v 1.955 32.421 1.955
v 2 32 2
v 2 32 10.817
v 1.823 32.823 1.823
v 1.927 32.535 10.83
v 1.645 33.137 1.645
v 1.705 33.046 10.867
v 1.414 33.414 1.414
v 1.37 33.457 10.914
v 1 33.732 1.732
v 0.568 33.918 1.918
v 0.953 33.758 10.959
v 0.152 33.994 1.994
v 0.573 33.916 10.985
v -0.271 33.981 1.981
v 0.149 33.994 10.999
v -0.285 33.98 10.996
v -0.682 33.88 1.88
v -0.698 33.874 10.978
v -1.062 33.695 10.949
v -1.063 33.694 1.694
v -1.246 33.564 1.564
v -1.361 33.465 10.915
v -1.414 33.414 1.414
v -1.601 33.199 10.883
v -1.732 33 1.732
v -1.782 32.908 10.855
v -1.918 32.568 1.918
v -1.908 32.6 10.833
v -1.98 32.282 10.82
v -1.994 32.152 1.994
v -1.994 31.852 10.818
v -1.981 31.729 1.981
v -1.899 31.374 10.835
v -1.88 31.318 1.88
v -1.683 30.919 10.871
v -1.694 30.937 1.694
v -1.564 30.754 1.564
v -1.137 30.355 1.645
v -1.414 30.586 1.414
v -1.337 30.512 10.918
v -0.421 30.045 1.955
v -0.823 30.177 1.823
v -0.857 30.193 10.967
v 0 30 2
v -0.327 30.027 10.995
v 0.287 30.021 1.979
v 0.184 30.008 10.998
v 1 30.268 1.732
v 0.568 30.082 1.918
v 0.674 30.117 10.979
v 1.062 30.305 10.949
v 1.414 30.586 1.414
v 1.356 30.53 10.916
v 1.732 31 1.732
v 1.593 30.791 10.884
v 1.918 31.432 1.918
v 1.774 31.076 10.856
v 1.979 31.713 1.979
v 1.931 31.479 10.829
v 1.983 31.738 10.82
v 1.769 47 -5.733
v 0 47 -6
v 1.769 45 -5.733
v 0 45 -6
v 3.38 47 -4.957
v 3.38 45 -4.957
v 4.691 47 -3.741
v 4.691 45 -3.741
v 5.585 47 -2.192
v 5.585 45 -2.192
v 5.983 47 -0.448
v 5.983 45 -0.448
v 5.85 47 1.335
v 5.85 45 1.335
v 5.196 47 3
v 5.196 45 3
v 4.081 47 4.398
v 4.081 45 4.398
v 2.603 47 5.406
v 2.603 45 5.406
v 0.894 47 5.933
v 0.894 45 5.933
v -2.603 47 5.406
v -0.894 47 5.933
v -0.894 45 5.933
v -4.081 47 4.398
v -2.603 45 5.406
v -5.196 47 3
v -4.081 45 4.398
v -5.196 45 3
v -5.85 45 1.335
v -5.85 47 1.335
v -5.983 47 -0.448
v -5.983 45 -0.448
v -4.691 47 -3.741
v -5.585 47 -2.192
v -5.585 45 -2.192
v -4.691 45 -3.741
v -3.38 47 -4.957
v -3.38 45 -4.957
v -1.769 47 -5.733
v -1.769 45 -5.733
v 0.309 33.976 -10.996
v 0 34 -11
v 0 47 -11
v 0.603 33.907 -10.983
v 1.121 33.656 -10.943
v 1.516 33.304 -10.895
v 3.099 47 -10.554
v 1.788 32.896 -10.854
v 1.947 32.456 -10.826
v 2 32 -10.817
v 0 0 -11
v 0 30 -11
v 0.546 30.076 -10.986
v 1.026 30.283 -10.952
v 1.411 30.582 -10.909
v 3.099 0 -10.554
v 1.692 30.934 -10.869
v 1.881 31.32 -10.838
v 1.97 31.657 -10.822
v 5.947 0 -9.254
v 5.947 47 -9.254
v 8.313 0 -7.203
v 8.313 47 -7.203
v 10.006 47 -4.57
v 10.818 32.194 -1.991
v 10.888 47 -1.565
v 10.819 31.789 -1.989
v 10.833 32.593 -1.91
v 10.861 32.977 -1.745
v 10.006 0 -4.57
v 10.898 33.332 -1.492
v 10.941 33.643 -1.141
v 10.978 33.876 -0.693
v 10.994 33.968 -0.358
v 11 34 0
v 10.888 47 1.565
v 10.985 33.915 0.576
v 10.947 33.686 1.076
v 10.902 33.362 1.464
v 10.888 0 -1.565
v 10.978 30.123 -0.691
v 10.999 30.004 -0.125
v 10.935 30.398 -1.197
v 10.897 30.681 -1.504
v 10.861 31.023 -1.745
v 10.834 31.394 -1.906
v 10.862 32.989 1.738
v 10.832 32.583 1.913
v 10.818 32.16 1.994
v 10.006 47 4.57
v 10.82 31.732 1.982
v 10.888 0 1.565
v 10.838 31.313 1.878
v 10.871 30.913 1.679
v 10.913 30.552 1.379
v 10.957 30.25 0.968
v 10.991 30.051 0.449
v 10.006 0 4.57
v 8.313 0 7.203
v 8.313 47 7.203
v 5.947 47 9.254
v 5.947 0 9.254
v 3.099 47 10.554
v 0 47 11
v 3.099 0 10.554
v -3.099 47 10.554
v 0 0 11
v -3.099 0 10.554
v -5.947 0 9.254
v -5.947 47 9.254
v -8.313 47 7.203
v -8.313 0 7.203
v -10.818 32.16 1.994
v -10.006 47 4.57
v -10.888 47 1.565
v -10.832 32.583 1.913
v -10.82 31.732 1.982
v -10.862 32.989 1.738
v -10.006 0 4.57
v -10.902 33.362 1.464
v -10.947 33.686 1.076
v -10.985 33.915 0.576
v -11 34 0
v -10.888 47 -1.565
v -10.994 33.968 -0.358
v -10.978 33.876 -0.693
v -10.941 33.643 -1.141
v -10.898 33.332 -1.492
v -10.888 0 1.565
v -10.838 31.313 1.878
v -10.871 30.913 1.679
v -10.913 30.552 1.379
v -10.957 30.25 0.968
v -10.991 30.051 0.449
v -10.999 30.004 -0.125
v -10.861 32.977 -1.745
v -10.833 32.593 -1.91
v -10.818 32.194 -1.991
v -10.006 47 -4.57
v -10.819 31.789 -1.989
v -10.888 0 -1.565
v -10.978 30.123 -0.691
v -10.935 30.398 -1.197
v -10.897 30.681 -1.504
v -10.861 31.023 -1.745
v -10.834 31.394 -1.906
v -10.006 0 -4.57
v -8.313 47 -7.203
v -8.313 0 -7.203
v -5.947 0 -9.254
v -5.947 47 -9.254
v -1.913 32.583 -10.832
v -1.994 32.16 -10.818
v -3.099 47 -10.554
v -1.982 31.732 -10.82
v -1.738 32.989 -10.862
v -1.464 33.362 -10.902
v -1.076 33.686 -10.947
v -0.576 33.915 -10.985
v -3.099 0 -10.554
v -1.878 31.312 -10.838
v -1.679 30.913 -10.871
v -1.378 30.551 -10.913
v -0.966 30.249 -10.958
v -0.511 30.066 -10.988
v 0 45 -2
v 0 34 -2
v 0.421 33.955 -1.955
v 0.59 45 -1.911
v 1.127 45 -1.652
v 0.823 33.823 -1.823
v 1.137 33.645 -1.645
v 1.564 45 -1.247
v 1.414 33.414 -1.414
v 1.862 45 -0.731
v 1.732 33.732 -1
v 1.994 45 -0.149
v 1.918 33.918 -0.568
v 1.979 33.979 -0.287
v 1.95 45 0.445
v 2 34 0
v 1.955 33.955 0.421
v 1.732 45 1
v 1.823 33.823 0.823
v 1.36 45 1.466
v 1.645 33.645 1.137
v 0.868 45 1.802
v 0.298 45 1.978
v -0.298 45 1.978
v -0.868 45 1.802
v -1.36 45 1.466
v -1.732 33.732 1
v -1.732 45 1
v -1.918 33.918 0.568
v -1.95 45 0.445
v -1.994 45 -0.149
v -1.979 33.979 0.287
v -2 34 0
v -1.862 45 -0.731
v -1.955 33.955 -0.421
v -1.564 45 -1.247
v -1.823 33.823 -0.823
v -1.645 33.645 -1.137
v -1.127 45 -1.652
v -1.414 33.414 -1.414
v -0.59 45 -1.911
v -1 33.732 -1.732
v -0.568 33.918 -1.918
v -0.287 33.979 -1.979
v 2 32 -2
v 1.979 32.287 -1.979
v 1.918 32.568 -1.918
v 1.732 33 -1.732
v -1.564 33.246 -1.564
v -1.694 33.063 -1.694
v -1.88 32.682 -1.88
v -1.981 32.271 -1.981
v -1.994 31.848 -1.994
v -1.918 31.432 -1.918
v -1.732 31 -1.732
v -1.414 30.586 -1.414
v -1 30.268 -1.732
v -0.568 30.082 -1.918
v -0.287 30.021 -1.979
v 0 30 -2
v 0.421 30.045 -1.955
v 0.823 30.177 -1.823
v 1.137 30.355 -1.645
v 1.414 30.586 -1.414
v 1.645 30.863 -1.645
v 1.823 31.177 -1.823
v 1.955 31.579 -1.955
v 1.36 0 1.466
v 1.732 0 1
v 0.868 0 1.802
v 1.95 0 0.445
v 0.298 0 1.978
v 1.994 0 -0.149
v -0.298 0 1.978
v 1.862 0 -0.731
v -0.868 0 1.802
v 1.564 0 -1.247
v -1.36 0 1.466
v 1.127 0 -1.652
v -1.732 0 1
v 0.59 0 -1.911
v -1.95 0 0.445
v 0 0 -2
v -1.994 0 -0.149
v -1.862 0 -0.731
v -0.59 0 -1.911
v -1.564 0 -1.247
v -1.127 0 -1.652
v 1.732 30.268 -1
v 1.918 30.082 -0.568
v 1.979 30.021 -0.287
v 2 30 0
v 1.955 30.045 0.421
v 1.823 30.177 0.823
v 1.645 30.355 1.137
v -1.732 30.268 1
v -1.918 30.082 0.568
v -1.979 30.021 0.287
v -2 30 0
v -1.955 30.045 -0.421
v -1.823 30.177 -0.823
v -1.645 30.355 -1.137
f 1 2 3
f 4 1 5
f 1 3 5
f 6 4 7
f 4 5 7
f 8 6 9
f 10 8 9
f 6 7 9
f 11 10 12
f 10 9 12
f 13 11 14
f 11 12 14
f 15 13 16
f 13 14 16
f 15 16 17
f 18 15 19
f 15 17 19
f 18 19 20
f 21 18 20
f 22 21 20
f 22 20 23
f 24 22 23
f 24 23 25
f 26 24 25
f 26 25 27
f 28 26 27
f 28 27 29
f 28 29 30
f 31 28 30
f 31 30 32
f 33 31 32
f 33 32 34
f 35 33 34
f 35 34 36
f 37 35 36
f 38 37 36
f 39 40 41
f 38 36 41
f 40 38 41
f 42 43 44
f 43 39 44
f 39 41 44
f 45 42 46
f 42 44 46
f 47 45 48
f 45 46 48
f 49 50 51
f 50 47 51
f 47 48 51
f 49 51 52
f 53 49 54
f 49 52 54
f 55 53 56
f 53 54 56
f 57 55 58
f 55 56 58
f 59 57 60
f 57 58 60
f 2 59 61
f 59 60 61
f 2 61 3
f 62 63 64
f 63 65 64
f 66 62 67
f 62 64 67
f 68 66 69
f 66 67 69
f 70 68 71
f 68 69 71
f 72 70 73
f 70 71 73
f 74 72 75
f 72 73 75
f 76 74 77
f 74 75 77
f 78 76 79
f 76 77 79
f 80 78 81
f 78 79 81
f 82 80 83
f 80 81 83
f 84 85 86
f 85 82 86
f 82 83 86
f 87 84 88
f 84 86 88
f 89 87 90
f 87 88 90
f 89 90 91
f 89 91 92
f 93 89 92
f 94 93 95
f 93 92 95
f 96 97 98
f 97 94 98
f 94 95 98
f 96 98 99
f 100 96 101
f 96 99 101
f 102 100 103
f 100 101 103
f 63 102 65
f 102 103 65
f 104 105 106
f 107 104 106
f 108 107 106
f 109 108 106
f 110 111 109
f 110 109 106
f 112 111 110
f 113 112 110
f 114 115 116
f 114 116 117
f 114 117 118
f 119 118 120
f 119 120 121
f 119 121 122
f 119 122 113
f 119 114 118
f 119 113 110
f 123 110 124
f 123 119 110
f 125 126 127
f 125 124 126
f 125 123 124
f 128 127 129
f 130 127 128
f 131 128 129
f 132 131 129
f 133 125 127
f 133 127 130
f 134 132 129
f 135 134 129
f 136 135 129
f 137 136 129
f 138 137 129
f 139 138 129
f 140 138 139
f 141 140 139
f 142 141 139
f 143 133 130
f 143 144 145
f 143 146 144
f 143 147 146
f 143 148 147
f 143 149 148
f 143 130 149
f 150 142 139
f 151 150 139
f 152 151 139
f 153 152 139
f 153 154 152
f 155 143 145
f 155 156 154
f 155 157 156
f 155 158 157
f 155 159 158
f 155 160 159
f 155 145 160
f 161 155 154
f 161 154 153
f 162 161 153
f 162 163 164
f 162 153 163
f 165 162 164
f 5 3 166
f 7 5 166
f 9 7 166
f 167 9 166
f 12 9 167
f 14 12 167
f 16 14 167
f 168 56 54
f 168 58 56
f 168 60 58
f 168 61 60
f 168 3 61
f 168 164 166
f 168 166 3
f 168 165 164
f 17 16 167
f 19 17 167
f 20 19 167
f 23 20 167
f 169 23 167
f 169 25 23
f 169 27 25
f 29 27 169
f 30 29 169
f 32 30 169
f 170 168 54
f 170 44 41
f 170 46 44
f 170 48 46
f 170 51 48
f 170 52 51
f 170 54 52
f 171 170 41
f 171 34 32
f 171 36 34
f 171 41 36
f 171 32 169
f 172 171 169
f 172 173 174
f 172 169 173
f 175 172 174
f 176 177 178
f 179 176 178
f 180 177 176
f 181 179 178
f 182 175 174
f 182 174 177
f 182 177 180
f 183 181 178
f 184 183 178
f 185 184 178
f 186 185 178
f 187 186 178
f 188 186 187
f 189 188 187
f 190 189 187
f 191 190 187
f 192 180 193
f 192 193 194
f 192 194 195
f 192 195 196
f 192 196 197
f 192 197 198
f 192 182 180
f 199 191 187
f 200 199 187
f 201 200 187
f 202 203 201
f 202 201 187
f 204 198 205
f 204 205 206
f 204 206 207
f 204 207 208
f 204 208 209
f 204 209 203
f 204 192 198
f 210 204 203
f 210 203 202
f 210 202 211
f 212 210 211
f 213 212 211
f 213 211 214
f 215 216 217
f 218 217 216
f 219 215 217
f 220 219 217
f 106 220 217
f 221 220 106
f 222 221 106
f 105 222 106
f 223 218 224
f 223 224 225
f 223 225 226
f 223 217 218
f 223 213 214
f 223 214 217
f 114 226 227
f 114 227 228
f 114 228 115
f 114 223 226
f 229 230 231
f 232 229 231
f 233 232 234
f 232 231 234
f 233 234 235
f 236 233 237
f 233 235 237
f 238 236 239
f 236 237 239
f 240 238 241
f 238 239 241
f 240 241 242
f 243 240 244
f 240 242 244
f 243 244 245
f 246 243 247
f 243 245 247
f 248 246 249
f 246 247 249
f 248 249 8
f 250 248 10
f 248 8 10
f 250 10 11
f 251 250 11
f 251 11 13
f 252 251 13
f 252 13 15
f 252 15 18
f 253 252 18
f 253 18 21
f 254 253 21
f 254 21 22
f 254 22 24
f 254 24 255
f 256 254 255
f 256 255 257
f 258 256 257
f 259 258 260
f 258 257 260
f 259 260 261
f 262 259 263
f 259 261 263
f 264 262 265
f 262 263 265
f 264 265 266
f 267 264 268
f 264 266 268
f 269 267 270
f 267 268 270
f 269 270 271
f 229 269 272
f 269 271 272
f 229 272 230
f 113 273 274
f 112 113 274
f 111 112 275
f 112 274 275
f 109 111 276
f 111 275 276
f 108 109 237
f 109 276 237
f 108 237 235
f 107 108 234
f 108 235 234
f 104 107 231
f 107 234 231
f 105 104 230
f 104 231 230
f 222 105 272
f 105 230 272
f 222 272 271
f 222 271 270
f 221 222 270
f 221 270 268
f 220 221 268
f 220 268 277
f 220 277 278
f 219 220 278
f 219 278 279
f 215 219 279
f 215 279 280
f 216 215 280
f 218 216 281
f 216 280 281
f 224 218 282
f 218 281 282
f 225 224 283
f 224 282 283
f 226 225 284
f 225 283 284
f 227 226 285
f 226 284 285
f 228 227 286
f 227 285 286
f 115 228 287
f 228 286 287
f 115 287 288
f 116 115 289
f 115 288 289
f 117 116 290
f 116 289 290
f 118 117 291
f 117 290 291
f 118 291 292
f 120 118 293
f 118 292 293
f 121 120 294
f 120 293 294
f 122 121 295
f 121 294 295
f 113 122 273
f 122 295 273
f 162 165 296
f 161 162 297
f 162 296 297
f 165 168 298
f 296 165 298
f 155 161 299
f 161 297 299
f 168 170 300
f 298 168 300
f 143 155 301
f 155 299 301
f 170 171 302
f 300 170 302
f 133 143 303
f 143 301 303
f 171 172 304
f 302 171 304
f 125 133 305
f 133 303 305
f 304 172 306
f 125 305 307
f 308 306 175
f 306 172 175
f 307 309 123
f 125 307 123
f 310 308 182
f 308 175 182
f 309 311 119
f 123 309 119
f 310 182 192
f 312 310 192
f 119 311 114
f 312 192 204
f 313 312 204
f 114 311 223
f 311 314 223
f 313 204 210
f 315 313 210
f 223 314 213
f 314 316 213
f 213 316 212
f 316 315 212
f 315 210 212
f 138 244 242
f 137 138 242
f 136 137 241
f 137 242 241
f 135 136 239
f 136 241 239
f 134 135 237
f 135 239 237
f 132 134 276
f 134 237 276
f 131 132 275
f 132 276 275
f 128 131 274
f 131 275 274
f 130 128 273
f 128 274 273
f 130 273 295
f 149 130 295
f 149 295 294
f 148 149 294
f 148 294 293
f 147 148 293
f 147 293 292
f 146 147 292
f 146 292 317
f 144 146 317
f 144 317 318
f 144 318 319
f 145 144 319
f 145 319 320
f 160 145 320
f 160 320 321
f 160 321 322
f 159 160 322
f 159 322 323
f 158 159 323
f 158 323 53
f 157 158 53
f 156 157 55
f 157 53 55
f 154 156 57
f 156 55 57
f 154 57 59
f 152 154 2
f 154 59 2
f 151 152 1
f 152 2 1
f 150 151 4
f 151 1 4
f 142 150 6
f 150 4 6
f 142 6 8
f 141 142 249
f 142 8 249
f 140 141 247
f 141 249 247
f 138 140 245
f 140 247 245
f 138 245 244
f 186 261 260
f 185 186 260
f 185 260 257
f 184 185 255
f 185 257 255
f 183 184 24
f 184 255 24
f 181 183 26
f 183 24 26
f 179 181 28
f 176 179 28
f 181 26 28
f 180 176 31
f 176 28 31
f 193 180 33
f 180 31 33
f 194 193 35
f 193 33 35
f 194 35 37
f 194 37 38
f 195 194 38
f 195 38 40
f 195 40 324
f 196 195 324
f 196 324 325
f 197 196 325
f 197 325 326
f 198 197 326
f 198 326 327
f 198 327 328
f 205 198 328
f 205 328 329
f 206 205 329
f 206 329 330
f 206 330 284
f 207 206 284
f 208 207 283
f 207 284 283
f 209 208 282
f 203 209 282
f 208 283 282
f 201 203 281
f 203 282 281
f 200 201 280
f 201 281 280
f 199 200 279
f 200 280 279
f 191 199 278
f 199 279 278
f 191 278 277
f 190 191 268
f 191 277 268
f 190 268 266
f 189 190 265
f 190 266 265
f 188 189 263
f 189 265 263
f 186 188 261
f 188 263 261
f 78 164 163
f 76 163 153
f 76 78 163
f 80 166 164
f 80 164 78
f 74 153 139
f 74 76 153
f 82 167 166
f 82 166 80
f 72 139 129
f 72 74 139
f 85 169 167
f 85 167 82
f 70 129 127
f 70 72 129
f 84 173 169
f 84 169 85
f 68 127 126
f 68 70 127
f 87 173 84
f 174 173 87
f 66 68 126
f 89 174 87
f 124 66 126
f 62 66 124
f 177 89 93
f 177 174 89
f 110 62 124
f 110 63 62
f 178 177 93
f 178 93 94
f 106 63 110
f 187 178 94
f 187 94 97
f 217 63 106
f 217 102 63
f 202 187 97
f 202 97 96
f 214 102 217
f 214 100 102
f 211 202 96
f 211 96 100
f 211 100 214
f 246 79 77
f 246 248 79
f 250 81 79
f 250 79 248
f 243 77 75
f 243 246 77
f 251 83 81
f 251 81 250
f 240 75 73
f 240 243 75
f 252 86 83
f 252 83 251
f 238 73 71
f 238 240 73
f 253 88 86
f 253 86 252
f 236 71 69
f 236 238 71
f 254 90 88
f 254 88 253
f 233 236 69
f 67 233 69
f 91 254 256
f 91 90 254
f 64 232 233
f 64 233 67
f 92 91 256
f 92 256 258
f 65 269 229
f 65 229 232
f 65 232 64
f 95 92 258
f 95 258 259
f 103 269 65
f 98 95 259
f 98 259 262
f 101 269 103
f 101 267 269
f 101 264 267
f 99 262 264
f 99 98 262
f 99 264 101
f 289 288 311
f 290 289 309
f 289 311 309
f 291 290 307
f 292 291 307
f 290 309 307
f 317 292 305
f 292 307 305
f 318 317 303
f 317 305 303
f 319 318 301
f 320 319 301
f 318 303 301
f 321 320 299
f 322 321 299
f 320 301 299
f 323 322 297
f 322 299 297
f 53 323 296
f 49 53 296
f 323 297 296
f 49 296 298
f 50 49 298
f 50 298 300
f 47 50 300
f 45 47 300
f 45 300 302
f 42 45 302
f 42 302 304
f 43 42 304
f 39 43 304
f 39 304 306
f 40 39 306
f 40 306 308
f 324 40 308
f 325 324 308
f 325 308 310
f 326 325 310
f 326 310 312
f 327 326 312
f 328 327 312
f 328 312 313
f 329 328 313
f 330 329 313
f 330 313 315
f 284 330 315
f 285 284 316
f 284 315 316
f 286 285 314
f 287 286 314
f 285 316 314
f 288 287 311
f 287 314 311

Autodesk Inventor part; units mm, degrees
ref_plane "YZ Plane" through (0, 0, 0) normal (1, 0, 0) x (0, 1, 0)
ref_plane "XZ Plane" through (0, 0, 0) normal (0, 1, 0) x (-1, 0, 0)
ref_plane "XY Plane" through (0, 0, 0) normal (0, 0, 1) x (1, 0, 0)
sketch "Sketch1" plane through (0, 0, 0) normal (1, 0, 0) x (0, 1, 0)
  line L0 (0, 0) -> (45, 0)
  line L1 (45, 0) -> (45, -11)
  line L2 (45, -11) -> (0, -11)
  line L3 (0, -11) -> (0, 0)
  line L4 (0, -11) -> (45, -11)
  line L5 (45, -11) -> (45, -2)
  line L6 (45, -2) -> (0, -2)
  line L7 (0, -2) -> (0, -11)
  line L8 (45, -11) -> (47, -11)
  line L9 (47, -11) -> (47, -6)
  line L10 (47, -6) -> (45, -6)
  line L11 (45, -6) -> (45, -11)
  point P0 (0, -2)
  dimension "d1" = 11
  dimension "d2" = 45
  dimension "d39" = 2
  dimension "d40" = 2
  dimension "d41" = 5
revolve "Revolution1" add sketch "Sketch1" angle 360 about axis through (0, 0, 0) along (0, 1, 0) contours L6 L1 L2 L3 | L10 L9 L8 L1
sketch "Sketch2" plane through (0, 0, 0) normal (1, 0, 0) x (0, 1, 0)
  circle A0 centre (32, 0) radius 2
  line L0 (45, 6) -> (45, -6) projected
  point P0 (0, 0)
  dimension "d8" = 4
  dimension "d42" = 13
extrude "Extrusion1" cut sketch "Sketch2" along normal through all both and the other way through all
sketch "Sketch3" plane through (0, 0, 0) normal (0, 0, 1) x (1, 0, 0)
  circle A0 centre (0, 32) radius 2
  line L0 (-6, 45) -> (6, 45) projected
  point P0 (0, 0)
  dimension "d13" = 4
  dimension "d43" = 13
extrude "Extrusion2" cut sketch "Sketch3" against normal through all both and the other way through all
properties part number "shaft"
